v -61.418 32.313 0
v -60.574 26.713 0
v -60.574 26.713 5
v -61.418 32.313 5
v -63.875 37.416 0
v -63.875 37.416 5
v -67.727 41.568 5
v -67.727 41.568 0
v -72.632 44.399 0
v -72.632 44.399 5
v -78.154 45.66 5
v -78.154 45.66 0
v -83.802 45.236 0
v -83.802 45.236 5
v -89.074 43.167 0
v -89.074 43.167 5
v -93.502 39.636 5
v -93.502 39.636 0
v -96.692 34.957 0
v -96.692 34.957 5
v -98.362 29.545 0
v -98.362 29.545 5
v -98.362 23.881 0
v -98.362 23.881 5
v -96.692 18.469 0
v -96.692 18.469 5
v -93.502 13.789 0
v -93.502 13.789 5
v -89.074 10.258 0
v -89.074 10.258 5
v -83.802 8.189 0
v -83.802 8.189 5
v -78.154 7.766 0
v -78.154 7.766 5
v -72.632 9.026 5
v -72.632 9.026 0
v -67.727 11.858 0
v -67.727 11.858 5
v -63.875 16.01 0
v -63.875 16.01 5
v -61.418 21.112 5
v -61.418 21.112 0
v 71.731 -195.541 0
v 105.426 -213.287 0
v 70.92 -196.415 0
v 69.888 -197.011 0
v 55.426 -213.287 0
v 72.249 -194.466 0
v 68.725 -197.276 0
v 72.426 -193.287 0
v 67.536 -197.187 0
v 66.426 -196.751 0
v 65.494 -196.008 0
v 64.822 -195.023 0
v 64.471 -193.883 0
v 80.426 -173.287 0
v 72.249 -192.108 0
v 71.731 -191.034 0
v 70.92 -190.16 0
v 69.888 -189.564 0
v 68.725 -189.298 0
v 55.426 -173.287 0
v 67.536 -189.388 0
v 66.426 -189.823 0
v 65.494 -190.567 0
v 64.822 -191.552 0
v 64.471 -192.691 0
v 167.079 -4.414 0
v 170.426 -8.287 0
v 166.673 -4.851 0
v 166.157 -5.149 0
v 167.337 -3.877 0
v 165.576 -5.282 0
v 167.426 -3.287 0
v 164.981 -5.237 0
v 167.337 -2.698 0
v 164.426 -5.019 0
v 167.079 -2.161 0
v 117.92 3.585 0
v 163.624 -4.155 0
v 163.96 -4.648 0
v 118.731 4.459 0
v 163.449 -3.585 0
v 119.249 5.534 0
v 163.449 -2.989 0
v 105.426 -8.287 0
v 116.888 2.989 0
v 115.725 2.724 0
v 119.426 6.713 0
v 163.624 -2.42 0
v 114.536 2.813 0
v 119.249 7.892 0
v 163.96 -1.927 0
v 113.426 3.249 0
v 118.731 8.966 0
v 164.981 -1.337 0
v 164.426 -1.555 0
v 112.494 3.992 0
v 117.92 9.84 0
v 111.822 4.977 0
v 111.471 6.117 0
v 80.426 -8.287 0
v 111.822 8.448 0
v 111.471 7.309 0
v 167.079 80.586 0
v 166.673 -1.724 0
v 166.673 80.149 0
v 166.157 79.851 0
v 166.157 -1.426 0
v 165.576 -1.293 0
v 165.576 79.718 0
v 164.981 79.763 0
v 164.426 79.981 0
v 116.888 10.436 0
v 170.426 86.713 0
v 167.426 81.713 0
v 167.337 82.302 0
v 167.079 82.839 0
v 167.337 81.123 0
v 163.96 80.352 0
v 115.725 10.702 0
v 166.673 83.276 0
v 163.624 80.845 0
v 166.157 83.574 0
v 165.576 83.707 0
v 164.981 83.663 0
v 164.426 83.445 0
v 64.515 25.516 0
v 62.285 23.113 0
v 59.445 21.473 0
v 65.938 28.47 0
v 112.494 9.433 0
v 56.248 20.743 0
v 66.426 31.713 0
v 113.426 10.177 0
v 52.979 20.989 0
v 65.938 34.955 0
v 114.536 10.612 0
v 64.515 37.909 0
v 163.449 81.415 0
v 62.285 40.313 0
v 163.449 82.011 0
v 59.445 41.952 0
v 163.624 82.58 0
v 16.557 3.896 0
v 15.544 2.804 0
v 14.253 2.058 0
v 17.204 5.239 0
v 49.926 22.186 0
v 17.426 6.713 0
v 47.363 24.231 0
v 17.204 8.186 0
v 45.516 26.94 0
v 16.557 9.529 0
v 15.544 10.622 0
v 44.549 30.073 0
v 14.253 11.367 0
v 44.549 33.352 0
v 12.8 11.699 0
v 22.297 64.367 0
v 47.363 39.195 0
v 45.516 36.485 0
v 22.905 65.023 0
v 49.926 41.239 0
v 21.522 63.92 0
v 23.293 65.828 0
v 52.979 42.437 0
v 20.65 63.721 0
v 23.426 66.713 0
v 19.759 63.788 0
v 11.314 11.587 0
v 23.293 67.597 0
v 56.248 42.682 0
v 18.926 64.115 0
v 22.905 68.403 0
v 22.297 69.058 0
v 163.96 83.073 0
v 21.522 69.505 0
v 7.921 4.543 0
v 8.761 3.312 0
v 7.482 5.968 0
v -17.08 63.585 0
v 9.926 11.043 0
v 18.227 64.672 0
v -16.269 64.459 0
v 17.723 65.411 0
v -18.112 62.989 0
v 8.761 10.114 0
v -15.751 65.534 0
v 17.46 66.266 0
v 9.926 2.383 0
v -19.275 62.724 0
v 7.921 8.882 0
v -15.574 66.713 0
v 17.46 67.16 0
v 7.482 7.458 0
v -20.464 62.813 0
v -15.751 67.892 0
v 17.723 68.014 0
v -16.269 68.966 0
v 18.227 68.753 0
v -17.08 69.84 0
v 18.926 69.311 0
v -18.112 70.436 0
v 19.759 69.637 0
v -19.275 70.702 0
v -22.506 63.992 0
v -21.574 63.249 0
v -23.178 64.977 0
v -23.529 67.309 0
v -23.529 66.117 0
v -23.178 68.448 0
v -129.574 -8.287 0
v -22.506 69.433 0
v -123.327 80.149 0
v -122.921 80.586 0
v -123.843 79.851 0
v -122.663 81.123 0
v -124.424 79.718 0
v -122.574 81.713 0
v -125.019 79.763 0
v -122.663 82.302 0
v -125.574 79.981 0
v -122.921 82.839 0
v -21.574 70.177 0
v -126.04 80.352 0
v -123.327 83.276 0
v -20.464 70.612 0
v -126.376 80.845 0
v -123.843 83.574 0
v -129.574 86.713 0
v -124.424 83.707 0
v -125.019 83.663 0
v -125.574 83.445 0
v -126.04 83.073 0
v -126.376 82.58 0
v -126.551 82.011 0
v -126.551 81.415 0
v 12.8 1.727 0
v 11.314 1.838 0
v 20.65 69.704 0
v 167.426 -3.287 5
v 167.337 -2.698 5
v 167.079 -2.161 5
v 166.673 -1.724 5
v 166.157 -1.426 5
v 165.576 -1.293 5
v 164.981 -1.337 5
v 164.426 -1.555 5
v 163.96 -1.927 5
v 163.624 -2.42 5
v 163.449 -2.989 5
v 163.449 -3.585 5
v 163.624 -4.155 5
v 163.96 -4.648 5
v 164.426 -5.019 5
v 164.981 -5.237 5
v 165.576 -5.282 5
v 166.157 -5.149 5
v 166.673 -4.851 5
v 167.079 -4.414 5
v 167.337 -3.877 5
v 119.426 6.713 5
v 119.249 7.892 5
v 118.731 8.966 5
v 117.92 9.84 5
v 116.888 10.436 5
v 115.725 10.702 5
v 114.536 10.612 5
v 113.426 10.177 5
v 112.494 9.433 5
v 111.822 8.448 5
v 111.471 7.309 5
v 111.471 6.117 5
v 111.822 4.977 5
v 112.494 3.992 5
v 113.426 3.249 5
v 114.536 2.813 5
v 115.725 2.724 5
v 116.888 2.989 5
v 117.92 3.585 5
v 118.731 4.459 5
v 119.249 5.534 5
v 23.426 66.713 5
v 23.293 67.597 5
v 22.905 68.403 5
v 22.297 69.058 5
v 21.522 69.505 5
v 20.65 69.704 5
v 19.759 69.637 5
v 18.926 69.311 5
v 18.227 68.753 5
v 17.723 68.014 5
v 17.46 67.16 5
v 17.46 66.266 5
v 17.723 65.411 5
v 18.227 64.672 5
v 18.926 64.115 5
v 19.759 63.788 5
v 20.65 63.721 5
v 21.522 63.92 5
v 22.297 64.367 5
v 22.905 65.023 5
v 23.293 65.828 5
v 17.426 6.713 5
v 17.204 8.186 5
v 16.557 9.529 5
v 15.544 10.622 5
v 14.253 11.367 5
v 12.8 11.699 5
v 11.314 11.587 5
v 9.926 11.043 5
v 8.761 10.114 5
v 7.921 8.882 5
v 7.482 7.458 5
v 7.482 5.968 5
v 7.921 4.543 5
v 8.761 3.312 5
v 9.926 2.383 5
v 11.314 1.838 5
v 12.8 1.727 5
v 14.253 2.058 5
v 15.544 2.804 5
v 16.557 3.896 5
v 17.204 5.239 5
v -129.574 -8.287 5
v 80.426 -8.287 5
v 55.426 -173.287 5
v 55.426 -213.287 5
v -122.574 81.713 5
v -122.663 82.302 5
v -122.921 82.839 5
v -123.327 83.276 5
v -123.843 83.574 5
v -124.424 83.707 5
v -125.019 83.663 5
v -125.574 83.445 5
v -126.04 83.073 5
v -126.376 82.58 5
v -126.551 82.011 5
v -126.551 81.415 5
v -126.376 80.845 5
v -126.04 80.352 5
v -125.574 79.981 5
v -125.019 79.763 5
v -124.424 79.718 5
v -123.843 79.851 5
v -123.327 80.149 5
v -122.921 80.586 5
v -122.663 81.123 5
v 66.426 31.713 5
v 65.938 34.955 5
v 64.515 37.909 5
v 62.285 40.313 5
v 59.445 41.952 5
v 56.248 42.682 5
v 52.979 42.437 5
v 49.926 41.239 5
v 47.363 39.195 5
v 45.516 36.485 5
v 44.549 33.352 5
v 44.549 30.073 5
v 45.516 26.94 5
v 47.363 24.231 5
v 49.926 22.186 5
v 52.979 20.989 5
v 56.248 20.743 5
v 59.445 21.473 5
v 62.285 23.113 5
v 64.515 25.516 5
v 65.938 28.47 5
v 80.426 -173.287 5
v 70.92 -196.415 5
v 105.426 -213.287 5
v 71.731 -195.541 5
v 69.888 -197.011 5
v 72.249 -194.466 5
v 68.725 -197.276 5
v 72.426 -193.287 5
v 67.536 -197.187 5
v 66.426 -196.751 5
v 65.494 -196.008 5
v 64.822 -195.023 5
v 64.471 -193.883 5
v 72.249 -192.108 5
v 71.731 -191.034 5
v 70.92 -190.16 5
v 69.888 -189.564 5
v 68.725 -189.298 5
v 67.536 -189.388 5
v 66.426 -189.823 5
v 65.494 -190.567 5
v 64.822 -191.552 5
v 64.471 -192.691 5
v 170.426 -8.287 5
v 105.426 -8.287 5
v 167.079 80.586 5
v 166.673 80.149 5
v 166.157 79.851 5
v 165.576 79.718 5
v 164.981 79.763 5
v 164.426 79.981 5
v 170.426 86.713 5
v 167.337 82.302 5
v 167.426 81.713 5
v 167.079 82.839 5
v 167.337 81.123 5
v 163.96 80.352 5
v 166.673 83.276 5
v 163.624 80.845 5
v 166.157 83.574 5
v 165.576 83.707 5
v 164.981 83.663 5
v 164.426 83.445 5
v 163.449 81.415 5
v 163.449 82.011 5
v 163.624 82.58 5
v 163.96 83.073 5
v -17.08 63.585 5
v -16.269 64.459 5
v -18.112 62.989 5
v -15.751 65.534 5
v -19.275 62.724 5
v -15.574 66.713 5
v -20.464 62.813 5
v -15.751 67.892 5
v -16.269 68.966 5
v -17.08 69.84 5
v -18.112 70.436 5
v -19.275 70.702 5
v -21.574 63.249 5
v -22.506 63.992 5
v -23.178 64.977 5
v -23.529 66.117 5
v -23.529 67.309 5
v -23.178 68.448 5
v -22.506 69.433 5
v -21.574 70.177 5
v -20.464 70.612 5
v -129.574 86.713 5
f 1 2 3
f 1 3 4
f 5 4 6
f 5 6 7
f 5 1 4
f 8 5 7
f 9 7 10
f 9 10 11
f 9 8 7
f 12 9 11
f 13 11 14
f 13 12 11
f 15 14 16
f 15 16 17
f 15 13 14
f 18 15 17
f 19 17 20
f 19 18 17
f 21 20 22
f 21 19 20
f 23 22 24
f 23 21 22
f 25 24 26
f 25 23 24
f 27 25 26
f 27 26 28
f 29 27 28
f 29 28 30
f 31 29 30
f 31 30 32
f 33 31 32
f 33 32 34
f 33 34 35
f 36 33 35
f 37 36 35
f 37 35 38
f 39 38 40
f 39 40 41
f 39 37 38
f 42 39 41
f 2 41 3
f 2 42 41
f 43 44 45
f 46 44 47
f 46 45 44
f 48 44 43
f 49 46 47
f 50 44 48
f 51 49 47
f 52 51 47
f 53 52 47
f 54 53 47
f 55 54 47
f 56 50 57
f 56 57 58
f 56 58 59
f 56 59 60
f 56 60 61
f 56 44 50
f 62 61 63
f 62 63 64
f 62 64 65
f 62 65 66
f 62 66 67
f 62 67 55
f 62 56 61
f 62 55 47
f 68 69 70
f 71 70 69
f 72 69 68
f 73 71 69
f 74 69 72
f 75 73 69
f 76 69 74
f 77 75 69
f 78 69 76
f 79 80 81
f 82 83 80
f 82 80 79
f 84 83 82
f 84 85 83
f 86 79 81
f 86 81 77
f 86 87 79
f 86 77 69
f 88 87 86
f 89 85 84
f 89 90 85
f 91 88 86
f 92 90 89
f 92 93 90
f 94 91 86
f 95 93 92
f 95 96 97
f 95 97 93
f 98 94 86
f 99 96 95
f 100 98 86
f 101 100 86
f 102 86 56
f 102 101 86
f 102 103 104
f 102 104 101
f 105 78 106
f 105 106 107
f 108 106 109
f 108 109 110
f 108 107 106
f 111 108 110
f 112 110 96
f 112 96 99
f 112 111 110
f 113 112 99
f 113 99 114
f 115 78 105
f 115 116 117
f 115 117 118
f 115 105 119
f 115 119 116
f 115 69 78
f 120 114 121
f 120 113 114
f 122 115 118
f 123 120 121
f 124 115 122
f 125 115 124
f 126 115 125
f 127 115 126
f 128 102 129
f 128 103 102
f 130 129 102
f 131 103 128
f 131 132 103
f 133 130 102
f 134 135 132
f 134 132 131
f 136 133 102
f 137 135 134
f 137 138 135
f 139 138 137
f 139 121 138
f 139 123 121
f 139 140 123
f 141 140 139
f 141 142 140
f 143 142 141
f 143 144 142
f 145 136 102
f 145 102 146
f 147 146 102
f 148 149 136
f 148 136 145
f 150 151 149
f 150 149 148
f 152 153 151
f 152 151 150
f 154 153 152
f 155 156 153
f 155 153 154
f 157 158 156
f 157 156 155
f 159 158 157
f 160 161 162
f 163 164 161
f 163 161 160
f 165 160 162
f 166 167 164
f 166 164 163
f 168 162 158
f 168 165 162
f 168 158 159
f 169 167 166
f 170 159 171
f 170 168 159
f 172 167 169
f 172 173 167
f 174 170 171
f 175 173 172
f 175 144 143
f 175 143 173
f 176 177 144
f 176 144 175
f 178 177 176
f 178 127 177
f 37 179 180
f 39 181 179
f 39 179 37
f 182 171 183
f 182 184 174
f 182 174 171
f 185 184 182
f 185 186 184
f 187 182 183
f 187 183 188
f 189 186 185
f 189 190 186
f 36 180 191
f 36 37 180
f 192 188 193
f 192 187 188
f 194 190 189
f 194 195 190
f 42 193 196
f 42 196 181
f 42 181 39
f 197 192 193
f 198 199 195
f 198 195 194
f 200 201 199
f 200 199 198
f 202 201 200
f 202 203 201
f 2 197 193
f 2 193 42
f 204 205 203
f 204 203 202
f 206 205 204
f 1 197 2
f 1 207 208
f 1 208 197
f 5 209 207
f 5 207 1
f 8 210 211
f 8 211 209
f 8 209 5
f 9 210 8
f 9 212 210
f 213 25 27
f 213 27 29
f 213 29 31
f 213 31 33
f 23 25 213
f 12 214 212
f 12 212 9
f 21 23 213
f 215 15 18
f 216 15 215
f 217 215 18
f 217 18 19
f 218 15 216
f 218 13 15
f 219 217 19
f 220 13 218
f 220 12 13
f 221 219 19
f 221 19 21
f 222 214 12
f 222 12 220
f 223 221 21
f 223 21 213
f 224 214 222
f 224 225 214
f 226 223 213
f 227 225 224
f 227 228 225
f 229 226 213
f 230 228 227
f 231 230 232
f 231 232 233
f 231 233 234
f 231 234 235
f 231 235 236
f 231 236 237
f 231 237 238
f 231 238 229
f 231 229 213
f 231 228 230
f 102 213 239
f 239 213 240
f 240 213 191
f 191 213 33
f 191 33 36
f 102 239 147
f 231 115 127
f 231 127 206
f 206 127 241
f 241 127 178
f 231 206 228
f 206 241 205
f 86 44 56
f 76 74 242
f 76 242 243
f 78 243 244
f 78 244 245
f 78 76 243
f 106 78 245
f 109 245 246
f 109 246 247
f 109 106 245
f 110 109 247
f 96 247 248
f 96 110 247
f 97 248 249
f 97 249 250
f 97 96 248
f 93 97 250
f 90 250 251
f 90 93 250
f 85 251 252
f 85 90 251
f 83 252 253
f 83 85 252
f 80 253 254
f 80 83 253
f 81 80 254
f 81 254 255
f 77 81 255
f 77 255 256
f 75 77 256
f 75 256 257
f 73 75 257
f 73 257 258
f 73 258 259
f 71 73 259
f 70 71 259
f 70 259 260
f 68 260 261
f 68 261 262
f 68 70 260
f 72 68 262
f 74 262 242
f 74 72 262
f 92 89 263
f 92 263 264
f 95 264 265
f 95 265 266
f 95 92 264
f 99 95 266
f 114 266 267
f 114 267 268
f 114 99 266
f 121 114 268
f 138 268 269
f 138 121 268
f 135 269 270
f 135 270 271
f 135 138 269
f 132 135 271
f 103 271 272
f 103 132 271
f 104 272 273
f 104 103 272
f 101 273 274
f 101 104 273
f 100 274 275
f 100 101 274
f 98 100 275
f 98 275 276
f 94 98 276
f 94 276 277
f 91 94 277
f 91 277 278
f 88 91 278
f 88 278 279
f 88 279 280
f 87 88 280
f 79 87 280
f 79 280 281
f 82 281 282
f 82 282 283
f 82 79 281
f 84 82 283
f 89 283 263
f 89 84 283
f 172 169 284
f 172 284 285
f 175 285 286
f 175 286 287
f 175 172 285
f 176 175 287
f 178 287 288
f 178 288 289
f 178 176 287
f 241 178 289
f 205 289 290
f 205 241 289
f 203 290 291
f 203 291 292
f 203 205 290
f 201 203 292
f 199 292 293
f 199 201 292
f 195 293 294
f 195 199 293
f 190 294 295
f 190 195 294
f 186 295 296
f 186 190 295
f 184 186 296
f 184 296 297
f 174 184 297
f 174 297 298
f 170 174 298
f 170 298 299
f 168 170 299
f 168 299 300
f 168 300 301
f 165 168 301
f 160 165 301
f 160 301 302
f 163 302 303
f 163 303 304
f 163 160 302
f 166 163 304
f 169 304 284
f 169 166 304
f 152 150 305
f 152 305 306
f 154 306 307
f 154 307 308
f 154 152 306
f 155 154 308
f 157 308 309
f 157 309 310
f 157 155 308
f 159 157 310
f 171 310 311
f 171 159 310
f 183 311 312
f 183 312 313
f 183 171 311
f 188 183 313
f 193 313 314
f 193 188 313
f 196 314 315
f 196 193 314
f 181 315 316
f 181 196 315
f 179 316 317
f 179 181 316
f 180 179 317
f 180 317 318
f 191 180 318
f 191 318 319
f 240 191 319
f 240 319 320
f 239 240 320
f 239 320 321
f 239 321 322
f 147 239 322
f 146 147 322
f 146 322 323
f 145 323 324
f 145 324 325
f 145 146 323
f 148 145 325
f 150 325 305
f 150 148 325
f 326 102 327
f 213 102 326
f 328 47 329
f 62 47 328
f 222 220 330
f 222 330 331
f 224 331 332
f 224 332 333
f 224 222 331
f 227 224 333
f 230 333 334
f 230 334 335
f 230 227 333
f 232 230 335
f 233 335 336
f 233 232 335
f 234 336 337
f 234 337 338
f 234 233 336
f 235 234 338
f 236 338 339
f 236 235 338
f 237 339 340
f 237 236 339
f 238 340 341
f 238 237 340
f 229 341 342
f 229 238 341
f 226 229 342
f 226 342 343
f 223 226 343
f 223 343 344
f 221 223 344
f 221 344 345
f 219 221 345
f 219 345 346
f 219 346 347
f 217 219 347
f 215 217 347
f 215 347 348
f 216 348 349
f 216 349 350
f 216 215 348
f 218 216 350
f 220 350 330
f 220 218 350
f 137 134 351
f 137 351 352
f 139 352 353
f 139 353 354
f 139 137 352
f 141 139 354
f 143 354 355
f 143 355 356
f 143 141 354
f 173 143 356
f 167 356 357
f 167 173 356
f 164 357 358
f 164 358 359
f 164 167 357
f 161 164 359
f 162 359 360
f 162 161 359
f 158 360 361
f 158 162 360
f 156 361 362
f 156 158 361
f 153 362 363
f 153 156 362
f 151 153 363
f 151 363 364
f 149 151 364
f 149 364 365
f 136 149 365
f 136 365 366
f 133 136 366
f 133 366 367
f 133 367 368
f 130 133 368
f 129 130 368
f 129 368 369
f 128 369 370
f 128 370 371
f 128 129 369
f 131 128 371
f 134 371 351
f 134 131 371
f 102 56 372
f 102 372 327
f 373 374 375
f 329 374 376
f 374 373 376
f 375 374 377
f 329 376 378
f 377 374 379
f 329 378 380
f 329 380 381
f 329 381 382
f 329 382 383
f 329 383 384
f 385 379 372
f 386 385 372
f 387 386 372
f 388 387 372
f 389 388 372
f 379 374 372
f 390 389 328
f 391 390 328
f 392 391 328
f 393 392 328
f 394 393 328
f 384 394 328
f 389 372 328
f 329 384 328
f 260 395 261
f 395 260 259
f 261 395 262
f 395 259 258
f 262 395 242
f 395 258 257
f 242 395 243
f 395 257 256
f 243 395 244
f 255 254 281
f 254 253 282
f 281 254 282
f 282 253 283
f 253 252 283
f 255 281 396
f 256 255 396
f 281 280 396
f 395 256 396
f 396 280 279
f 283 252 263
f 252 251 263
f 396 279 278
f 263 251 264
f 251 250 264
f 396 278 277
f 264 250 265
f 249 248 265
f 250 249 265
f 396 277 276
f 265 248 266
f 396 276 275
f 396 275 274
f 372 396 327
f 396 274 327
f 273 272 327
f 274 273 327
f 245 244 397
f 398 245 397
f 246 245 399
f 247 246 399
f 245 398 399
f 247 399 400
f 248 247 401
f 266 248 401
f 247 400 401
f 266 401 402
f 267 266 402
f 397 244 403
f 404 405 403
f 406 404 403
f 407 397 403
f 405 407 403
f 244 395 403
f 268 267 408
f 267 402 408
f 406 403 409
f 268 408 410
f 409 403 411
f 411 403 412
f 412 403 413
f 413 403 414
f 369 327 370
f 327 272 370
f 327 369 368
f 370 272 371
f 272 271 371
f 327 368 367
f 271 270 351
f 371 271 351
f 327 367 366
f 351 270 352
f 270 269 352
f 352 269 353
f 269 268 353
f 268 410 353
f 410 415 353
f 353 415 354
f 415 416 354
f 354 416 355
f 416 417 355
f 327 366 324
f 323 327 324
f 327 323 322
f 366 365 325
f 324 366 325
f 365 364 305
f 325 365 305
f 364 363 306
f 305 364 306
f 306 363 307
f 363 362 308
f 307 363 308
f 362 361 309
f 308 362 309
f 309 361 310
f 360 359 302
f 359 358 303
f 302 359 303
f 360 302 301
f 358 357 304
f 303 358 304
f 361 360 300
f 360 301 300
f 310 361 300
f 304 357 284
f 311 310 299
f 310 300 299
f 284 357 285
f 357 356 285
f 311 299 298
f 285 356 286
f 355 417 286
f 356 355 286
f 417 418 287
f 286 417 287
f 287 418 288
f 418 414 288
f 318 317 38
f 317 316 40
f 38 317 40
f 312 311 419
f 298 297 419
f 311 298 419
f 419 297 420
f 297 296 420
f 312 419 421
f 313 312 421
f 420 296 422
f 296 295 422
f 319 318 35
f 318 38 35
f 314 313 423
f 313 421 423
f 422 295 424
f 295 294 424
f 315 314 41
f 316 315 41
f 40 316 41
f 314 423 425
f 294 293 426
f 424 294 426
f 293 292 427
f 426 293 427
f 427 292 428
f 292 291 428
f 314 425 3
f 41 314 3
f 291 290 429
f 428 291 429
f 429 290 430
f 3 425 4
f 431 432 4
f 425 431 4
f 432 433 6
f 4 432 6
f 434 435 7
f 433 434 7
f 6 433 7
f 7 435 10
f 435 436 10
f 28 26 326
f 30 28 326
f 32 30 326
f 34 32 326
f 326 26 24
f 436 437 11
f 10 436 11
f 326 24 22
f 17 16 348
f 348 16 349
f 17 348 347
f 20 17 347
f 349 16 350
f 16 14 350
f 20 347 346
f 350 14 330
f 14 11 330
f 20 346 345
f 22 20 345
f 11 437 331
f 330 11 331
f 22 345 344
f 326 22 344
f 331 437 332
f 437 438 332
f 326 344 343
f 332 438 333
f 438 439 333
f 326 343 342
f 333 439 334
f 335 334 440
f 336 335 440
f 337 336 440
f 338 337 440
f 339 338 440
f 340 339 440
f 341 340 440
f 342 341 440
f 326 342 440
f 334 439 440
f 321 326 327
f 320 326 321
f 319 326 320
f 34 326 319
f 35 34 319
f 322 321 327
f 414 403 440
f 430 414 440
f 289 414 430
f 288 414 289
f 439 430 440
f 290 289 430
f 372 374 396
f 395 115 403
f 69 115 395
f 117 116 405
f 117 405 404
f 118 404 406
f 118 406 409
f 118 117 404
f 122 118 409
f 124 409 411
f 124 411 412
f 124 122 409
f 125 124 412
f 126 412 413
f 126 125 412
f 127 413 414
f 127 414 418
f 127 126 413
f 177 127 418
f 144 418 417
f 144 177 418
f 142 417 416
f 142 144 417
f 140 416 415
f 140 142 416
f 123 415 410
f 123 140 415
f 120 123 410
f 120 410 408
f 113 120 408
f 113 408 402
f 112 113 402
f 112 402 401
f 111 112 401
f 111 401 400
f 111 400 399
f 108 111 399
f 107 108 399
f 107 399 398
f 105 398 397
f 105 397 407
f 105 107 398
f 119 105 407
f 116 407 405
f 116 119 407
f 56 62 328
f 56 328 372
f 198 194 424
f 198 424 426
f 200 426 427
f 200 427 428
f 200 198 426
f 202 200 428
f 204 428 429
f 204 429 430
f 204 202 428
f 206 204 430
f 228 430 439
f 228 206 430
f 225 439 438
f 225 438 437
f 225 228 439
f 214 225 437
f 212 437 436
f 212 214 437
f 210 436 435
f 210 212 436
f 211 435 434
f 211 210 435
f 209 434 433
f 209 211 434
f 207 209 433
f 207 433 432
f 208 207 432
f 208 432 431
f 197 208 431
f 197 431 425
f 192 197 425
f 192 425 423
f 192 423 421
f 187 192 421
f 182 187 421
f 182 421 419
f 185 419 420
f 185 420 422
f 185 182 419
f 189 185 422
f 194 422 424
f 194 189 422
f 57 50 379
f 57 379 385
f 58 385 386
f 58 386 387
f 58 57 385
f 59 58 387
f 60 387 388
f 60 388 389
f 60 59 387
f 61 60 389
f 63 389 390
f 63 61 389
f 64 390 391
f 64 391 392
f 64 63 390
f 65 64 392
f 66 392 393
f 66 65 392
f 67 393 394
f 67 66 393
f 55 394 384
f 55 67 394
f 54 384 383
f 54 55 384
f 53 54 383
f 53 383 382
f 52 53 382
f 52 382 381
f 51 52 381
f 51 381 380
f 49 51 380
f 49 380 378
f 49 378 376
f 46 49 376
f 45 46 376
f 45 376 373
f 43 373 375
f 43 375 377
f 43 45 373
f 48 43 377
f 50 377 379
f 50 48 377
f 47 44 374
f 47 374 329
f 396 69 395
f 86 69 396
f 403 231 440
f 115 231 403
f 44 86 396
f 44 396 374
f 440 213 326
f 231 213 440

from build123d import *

# Parameters (mm, degrees)
SKETCH1_R      = 4
SKETCH1_R_2    = 11
SKETCH1_R_3    = 19
SKETCH1_R_4    = 5
SKETCH1_R_5    = 3
SKETCH1_R_6    = 2
EXTRUDE1_DEPTH = 5


with BuildPart() as part:
    # Sketch1 → Extrude1 (new body)
    with BuildSketch(Plane.XY):
        Polygon((105.426271186, -213.287288136), (55.426271186, -213.287288136), (55.426271186, -173.287288136), (80.426271186, -173.287288136), (80.426271186, -8.287288136), (-129.573728814, -8.287288136), (-129.573728814, 86.712711864), (170.426271186, 86.712711864), (170.426271186, -8.287288136), (105.426271186, -8.287288136), align=None)
        with Locations((68.426271186, -193.287288136)):
            Circle(SKETCH1_R, mode=Mode.SUBTRACT)
        with Locations((115.426271186, 6.712711864)):
            Circle(SKETCH1_R, mode=Mode.SUBTRACT)
        with Locations((55.426271186, 31.712711864)):
            Circle(SKETCH1_R_2, mode=Mode.SUBTRACT)
        with Locations((-79.573728814, 26.712711864)):
            Circle(SKETCH1_R_3, mode=Mode.SUBTRACT)
        with Locations((12.426271186, 6.712711864)):
            Circle(SKETCH1_R_4, mode=Mode.SUBTRACT)
        with Locations((20.426271186, 66.712711864)):
            Circle(SKETCH1_R_5, mode=Mode.SUBTRACT)
        with Locations((-124.573728814, 81.712711864)):
            Circle(SKETCH1_R_6, mode=Mode.SUBTRACT)
        with Locations((165.426271186, 81.712711864)):
            Circle(SKETCH1_R_6, mode=Mode.SUBTRACT)
        with Locations((165.426271186, -3.287288136)):
            Circle(SKETCH1_R_6, mode=Mode.SUBTRACT)
        with Locations((-19.573728814, 66.712711864)):
            Circle(SKETCH1_R, mode=Mode.SUBTRACT)
    extrude(amount=EXTRUDE1_DEPTH)


solid = part.part
